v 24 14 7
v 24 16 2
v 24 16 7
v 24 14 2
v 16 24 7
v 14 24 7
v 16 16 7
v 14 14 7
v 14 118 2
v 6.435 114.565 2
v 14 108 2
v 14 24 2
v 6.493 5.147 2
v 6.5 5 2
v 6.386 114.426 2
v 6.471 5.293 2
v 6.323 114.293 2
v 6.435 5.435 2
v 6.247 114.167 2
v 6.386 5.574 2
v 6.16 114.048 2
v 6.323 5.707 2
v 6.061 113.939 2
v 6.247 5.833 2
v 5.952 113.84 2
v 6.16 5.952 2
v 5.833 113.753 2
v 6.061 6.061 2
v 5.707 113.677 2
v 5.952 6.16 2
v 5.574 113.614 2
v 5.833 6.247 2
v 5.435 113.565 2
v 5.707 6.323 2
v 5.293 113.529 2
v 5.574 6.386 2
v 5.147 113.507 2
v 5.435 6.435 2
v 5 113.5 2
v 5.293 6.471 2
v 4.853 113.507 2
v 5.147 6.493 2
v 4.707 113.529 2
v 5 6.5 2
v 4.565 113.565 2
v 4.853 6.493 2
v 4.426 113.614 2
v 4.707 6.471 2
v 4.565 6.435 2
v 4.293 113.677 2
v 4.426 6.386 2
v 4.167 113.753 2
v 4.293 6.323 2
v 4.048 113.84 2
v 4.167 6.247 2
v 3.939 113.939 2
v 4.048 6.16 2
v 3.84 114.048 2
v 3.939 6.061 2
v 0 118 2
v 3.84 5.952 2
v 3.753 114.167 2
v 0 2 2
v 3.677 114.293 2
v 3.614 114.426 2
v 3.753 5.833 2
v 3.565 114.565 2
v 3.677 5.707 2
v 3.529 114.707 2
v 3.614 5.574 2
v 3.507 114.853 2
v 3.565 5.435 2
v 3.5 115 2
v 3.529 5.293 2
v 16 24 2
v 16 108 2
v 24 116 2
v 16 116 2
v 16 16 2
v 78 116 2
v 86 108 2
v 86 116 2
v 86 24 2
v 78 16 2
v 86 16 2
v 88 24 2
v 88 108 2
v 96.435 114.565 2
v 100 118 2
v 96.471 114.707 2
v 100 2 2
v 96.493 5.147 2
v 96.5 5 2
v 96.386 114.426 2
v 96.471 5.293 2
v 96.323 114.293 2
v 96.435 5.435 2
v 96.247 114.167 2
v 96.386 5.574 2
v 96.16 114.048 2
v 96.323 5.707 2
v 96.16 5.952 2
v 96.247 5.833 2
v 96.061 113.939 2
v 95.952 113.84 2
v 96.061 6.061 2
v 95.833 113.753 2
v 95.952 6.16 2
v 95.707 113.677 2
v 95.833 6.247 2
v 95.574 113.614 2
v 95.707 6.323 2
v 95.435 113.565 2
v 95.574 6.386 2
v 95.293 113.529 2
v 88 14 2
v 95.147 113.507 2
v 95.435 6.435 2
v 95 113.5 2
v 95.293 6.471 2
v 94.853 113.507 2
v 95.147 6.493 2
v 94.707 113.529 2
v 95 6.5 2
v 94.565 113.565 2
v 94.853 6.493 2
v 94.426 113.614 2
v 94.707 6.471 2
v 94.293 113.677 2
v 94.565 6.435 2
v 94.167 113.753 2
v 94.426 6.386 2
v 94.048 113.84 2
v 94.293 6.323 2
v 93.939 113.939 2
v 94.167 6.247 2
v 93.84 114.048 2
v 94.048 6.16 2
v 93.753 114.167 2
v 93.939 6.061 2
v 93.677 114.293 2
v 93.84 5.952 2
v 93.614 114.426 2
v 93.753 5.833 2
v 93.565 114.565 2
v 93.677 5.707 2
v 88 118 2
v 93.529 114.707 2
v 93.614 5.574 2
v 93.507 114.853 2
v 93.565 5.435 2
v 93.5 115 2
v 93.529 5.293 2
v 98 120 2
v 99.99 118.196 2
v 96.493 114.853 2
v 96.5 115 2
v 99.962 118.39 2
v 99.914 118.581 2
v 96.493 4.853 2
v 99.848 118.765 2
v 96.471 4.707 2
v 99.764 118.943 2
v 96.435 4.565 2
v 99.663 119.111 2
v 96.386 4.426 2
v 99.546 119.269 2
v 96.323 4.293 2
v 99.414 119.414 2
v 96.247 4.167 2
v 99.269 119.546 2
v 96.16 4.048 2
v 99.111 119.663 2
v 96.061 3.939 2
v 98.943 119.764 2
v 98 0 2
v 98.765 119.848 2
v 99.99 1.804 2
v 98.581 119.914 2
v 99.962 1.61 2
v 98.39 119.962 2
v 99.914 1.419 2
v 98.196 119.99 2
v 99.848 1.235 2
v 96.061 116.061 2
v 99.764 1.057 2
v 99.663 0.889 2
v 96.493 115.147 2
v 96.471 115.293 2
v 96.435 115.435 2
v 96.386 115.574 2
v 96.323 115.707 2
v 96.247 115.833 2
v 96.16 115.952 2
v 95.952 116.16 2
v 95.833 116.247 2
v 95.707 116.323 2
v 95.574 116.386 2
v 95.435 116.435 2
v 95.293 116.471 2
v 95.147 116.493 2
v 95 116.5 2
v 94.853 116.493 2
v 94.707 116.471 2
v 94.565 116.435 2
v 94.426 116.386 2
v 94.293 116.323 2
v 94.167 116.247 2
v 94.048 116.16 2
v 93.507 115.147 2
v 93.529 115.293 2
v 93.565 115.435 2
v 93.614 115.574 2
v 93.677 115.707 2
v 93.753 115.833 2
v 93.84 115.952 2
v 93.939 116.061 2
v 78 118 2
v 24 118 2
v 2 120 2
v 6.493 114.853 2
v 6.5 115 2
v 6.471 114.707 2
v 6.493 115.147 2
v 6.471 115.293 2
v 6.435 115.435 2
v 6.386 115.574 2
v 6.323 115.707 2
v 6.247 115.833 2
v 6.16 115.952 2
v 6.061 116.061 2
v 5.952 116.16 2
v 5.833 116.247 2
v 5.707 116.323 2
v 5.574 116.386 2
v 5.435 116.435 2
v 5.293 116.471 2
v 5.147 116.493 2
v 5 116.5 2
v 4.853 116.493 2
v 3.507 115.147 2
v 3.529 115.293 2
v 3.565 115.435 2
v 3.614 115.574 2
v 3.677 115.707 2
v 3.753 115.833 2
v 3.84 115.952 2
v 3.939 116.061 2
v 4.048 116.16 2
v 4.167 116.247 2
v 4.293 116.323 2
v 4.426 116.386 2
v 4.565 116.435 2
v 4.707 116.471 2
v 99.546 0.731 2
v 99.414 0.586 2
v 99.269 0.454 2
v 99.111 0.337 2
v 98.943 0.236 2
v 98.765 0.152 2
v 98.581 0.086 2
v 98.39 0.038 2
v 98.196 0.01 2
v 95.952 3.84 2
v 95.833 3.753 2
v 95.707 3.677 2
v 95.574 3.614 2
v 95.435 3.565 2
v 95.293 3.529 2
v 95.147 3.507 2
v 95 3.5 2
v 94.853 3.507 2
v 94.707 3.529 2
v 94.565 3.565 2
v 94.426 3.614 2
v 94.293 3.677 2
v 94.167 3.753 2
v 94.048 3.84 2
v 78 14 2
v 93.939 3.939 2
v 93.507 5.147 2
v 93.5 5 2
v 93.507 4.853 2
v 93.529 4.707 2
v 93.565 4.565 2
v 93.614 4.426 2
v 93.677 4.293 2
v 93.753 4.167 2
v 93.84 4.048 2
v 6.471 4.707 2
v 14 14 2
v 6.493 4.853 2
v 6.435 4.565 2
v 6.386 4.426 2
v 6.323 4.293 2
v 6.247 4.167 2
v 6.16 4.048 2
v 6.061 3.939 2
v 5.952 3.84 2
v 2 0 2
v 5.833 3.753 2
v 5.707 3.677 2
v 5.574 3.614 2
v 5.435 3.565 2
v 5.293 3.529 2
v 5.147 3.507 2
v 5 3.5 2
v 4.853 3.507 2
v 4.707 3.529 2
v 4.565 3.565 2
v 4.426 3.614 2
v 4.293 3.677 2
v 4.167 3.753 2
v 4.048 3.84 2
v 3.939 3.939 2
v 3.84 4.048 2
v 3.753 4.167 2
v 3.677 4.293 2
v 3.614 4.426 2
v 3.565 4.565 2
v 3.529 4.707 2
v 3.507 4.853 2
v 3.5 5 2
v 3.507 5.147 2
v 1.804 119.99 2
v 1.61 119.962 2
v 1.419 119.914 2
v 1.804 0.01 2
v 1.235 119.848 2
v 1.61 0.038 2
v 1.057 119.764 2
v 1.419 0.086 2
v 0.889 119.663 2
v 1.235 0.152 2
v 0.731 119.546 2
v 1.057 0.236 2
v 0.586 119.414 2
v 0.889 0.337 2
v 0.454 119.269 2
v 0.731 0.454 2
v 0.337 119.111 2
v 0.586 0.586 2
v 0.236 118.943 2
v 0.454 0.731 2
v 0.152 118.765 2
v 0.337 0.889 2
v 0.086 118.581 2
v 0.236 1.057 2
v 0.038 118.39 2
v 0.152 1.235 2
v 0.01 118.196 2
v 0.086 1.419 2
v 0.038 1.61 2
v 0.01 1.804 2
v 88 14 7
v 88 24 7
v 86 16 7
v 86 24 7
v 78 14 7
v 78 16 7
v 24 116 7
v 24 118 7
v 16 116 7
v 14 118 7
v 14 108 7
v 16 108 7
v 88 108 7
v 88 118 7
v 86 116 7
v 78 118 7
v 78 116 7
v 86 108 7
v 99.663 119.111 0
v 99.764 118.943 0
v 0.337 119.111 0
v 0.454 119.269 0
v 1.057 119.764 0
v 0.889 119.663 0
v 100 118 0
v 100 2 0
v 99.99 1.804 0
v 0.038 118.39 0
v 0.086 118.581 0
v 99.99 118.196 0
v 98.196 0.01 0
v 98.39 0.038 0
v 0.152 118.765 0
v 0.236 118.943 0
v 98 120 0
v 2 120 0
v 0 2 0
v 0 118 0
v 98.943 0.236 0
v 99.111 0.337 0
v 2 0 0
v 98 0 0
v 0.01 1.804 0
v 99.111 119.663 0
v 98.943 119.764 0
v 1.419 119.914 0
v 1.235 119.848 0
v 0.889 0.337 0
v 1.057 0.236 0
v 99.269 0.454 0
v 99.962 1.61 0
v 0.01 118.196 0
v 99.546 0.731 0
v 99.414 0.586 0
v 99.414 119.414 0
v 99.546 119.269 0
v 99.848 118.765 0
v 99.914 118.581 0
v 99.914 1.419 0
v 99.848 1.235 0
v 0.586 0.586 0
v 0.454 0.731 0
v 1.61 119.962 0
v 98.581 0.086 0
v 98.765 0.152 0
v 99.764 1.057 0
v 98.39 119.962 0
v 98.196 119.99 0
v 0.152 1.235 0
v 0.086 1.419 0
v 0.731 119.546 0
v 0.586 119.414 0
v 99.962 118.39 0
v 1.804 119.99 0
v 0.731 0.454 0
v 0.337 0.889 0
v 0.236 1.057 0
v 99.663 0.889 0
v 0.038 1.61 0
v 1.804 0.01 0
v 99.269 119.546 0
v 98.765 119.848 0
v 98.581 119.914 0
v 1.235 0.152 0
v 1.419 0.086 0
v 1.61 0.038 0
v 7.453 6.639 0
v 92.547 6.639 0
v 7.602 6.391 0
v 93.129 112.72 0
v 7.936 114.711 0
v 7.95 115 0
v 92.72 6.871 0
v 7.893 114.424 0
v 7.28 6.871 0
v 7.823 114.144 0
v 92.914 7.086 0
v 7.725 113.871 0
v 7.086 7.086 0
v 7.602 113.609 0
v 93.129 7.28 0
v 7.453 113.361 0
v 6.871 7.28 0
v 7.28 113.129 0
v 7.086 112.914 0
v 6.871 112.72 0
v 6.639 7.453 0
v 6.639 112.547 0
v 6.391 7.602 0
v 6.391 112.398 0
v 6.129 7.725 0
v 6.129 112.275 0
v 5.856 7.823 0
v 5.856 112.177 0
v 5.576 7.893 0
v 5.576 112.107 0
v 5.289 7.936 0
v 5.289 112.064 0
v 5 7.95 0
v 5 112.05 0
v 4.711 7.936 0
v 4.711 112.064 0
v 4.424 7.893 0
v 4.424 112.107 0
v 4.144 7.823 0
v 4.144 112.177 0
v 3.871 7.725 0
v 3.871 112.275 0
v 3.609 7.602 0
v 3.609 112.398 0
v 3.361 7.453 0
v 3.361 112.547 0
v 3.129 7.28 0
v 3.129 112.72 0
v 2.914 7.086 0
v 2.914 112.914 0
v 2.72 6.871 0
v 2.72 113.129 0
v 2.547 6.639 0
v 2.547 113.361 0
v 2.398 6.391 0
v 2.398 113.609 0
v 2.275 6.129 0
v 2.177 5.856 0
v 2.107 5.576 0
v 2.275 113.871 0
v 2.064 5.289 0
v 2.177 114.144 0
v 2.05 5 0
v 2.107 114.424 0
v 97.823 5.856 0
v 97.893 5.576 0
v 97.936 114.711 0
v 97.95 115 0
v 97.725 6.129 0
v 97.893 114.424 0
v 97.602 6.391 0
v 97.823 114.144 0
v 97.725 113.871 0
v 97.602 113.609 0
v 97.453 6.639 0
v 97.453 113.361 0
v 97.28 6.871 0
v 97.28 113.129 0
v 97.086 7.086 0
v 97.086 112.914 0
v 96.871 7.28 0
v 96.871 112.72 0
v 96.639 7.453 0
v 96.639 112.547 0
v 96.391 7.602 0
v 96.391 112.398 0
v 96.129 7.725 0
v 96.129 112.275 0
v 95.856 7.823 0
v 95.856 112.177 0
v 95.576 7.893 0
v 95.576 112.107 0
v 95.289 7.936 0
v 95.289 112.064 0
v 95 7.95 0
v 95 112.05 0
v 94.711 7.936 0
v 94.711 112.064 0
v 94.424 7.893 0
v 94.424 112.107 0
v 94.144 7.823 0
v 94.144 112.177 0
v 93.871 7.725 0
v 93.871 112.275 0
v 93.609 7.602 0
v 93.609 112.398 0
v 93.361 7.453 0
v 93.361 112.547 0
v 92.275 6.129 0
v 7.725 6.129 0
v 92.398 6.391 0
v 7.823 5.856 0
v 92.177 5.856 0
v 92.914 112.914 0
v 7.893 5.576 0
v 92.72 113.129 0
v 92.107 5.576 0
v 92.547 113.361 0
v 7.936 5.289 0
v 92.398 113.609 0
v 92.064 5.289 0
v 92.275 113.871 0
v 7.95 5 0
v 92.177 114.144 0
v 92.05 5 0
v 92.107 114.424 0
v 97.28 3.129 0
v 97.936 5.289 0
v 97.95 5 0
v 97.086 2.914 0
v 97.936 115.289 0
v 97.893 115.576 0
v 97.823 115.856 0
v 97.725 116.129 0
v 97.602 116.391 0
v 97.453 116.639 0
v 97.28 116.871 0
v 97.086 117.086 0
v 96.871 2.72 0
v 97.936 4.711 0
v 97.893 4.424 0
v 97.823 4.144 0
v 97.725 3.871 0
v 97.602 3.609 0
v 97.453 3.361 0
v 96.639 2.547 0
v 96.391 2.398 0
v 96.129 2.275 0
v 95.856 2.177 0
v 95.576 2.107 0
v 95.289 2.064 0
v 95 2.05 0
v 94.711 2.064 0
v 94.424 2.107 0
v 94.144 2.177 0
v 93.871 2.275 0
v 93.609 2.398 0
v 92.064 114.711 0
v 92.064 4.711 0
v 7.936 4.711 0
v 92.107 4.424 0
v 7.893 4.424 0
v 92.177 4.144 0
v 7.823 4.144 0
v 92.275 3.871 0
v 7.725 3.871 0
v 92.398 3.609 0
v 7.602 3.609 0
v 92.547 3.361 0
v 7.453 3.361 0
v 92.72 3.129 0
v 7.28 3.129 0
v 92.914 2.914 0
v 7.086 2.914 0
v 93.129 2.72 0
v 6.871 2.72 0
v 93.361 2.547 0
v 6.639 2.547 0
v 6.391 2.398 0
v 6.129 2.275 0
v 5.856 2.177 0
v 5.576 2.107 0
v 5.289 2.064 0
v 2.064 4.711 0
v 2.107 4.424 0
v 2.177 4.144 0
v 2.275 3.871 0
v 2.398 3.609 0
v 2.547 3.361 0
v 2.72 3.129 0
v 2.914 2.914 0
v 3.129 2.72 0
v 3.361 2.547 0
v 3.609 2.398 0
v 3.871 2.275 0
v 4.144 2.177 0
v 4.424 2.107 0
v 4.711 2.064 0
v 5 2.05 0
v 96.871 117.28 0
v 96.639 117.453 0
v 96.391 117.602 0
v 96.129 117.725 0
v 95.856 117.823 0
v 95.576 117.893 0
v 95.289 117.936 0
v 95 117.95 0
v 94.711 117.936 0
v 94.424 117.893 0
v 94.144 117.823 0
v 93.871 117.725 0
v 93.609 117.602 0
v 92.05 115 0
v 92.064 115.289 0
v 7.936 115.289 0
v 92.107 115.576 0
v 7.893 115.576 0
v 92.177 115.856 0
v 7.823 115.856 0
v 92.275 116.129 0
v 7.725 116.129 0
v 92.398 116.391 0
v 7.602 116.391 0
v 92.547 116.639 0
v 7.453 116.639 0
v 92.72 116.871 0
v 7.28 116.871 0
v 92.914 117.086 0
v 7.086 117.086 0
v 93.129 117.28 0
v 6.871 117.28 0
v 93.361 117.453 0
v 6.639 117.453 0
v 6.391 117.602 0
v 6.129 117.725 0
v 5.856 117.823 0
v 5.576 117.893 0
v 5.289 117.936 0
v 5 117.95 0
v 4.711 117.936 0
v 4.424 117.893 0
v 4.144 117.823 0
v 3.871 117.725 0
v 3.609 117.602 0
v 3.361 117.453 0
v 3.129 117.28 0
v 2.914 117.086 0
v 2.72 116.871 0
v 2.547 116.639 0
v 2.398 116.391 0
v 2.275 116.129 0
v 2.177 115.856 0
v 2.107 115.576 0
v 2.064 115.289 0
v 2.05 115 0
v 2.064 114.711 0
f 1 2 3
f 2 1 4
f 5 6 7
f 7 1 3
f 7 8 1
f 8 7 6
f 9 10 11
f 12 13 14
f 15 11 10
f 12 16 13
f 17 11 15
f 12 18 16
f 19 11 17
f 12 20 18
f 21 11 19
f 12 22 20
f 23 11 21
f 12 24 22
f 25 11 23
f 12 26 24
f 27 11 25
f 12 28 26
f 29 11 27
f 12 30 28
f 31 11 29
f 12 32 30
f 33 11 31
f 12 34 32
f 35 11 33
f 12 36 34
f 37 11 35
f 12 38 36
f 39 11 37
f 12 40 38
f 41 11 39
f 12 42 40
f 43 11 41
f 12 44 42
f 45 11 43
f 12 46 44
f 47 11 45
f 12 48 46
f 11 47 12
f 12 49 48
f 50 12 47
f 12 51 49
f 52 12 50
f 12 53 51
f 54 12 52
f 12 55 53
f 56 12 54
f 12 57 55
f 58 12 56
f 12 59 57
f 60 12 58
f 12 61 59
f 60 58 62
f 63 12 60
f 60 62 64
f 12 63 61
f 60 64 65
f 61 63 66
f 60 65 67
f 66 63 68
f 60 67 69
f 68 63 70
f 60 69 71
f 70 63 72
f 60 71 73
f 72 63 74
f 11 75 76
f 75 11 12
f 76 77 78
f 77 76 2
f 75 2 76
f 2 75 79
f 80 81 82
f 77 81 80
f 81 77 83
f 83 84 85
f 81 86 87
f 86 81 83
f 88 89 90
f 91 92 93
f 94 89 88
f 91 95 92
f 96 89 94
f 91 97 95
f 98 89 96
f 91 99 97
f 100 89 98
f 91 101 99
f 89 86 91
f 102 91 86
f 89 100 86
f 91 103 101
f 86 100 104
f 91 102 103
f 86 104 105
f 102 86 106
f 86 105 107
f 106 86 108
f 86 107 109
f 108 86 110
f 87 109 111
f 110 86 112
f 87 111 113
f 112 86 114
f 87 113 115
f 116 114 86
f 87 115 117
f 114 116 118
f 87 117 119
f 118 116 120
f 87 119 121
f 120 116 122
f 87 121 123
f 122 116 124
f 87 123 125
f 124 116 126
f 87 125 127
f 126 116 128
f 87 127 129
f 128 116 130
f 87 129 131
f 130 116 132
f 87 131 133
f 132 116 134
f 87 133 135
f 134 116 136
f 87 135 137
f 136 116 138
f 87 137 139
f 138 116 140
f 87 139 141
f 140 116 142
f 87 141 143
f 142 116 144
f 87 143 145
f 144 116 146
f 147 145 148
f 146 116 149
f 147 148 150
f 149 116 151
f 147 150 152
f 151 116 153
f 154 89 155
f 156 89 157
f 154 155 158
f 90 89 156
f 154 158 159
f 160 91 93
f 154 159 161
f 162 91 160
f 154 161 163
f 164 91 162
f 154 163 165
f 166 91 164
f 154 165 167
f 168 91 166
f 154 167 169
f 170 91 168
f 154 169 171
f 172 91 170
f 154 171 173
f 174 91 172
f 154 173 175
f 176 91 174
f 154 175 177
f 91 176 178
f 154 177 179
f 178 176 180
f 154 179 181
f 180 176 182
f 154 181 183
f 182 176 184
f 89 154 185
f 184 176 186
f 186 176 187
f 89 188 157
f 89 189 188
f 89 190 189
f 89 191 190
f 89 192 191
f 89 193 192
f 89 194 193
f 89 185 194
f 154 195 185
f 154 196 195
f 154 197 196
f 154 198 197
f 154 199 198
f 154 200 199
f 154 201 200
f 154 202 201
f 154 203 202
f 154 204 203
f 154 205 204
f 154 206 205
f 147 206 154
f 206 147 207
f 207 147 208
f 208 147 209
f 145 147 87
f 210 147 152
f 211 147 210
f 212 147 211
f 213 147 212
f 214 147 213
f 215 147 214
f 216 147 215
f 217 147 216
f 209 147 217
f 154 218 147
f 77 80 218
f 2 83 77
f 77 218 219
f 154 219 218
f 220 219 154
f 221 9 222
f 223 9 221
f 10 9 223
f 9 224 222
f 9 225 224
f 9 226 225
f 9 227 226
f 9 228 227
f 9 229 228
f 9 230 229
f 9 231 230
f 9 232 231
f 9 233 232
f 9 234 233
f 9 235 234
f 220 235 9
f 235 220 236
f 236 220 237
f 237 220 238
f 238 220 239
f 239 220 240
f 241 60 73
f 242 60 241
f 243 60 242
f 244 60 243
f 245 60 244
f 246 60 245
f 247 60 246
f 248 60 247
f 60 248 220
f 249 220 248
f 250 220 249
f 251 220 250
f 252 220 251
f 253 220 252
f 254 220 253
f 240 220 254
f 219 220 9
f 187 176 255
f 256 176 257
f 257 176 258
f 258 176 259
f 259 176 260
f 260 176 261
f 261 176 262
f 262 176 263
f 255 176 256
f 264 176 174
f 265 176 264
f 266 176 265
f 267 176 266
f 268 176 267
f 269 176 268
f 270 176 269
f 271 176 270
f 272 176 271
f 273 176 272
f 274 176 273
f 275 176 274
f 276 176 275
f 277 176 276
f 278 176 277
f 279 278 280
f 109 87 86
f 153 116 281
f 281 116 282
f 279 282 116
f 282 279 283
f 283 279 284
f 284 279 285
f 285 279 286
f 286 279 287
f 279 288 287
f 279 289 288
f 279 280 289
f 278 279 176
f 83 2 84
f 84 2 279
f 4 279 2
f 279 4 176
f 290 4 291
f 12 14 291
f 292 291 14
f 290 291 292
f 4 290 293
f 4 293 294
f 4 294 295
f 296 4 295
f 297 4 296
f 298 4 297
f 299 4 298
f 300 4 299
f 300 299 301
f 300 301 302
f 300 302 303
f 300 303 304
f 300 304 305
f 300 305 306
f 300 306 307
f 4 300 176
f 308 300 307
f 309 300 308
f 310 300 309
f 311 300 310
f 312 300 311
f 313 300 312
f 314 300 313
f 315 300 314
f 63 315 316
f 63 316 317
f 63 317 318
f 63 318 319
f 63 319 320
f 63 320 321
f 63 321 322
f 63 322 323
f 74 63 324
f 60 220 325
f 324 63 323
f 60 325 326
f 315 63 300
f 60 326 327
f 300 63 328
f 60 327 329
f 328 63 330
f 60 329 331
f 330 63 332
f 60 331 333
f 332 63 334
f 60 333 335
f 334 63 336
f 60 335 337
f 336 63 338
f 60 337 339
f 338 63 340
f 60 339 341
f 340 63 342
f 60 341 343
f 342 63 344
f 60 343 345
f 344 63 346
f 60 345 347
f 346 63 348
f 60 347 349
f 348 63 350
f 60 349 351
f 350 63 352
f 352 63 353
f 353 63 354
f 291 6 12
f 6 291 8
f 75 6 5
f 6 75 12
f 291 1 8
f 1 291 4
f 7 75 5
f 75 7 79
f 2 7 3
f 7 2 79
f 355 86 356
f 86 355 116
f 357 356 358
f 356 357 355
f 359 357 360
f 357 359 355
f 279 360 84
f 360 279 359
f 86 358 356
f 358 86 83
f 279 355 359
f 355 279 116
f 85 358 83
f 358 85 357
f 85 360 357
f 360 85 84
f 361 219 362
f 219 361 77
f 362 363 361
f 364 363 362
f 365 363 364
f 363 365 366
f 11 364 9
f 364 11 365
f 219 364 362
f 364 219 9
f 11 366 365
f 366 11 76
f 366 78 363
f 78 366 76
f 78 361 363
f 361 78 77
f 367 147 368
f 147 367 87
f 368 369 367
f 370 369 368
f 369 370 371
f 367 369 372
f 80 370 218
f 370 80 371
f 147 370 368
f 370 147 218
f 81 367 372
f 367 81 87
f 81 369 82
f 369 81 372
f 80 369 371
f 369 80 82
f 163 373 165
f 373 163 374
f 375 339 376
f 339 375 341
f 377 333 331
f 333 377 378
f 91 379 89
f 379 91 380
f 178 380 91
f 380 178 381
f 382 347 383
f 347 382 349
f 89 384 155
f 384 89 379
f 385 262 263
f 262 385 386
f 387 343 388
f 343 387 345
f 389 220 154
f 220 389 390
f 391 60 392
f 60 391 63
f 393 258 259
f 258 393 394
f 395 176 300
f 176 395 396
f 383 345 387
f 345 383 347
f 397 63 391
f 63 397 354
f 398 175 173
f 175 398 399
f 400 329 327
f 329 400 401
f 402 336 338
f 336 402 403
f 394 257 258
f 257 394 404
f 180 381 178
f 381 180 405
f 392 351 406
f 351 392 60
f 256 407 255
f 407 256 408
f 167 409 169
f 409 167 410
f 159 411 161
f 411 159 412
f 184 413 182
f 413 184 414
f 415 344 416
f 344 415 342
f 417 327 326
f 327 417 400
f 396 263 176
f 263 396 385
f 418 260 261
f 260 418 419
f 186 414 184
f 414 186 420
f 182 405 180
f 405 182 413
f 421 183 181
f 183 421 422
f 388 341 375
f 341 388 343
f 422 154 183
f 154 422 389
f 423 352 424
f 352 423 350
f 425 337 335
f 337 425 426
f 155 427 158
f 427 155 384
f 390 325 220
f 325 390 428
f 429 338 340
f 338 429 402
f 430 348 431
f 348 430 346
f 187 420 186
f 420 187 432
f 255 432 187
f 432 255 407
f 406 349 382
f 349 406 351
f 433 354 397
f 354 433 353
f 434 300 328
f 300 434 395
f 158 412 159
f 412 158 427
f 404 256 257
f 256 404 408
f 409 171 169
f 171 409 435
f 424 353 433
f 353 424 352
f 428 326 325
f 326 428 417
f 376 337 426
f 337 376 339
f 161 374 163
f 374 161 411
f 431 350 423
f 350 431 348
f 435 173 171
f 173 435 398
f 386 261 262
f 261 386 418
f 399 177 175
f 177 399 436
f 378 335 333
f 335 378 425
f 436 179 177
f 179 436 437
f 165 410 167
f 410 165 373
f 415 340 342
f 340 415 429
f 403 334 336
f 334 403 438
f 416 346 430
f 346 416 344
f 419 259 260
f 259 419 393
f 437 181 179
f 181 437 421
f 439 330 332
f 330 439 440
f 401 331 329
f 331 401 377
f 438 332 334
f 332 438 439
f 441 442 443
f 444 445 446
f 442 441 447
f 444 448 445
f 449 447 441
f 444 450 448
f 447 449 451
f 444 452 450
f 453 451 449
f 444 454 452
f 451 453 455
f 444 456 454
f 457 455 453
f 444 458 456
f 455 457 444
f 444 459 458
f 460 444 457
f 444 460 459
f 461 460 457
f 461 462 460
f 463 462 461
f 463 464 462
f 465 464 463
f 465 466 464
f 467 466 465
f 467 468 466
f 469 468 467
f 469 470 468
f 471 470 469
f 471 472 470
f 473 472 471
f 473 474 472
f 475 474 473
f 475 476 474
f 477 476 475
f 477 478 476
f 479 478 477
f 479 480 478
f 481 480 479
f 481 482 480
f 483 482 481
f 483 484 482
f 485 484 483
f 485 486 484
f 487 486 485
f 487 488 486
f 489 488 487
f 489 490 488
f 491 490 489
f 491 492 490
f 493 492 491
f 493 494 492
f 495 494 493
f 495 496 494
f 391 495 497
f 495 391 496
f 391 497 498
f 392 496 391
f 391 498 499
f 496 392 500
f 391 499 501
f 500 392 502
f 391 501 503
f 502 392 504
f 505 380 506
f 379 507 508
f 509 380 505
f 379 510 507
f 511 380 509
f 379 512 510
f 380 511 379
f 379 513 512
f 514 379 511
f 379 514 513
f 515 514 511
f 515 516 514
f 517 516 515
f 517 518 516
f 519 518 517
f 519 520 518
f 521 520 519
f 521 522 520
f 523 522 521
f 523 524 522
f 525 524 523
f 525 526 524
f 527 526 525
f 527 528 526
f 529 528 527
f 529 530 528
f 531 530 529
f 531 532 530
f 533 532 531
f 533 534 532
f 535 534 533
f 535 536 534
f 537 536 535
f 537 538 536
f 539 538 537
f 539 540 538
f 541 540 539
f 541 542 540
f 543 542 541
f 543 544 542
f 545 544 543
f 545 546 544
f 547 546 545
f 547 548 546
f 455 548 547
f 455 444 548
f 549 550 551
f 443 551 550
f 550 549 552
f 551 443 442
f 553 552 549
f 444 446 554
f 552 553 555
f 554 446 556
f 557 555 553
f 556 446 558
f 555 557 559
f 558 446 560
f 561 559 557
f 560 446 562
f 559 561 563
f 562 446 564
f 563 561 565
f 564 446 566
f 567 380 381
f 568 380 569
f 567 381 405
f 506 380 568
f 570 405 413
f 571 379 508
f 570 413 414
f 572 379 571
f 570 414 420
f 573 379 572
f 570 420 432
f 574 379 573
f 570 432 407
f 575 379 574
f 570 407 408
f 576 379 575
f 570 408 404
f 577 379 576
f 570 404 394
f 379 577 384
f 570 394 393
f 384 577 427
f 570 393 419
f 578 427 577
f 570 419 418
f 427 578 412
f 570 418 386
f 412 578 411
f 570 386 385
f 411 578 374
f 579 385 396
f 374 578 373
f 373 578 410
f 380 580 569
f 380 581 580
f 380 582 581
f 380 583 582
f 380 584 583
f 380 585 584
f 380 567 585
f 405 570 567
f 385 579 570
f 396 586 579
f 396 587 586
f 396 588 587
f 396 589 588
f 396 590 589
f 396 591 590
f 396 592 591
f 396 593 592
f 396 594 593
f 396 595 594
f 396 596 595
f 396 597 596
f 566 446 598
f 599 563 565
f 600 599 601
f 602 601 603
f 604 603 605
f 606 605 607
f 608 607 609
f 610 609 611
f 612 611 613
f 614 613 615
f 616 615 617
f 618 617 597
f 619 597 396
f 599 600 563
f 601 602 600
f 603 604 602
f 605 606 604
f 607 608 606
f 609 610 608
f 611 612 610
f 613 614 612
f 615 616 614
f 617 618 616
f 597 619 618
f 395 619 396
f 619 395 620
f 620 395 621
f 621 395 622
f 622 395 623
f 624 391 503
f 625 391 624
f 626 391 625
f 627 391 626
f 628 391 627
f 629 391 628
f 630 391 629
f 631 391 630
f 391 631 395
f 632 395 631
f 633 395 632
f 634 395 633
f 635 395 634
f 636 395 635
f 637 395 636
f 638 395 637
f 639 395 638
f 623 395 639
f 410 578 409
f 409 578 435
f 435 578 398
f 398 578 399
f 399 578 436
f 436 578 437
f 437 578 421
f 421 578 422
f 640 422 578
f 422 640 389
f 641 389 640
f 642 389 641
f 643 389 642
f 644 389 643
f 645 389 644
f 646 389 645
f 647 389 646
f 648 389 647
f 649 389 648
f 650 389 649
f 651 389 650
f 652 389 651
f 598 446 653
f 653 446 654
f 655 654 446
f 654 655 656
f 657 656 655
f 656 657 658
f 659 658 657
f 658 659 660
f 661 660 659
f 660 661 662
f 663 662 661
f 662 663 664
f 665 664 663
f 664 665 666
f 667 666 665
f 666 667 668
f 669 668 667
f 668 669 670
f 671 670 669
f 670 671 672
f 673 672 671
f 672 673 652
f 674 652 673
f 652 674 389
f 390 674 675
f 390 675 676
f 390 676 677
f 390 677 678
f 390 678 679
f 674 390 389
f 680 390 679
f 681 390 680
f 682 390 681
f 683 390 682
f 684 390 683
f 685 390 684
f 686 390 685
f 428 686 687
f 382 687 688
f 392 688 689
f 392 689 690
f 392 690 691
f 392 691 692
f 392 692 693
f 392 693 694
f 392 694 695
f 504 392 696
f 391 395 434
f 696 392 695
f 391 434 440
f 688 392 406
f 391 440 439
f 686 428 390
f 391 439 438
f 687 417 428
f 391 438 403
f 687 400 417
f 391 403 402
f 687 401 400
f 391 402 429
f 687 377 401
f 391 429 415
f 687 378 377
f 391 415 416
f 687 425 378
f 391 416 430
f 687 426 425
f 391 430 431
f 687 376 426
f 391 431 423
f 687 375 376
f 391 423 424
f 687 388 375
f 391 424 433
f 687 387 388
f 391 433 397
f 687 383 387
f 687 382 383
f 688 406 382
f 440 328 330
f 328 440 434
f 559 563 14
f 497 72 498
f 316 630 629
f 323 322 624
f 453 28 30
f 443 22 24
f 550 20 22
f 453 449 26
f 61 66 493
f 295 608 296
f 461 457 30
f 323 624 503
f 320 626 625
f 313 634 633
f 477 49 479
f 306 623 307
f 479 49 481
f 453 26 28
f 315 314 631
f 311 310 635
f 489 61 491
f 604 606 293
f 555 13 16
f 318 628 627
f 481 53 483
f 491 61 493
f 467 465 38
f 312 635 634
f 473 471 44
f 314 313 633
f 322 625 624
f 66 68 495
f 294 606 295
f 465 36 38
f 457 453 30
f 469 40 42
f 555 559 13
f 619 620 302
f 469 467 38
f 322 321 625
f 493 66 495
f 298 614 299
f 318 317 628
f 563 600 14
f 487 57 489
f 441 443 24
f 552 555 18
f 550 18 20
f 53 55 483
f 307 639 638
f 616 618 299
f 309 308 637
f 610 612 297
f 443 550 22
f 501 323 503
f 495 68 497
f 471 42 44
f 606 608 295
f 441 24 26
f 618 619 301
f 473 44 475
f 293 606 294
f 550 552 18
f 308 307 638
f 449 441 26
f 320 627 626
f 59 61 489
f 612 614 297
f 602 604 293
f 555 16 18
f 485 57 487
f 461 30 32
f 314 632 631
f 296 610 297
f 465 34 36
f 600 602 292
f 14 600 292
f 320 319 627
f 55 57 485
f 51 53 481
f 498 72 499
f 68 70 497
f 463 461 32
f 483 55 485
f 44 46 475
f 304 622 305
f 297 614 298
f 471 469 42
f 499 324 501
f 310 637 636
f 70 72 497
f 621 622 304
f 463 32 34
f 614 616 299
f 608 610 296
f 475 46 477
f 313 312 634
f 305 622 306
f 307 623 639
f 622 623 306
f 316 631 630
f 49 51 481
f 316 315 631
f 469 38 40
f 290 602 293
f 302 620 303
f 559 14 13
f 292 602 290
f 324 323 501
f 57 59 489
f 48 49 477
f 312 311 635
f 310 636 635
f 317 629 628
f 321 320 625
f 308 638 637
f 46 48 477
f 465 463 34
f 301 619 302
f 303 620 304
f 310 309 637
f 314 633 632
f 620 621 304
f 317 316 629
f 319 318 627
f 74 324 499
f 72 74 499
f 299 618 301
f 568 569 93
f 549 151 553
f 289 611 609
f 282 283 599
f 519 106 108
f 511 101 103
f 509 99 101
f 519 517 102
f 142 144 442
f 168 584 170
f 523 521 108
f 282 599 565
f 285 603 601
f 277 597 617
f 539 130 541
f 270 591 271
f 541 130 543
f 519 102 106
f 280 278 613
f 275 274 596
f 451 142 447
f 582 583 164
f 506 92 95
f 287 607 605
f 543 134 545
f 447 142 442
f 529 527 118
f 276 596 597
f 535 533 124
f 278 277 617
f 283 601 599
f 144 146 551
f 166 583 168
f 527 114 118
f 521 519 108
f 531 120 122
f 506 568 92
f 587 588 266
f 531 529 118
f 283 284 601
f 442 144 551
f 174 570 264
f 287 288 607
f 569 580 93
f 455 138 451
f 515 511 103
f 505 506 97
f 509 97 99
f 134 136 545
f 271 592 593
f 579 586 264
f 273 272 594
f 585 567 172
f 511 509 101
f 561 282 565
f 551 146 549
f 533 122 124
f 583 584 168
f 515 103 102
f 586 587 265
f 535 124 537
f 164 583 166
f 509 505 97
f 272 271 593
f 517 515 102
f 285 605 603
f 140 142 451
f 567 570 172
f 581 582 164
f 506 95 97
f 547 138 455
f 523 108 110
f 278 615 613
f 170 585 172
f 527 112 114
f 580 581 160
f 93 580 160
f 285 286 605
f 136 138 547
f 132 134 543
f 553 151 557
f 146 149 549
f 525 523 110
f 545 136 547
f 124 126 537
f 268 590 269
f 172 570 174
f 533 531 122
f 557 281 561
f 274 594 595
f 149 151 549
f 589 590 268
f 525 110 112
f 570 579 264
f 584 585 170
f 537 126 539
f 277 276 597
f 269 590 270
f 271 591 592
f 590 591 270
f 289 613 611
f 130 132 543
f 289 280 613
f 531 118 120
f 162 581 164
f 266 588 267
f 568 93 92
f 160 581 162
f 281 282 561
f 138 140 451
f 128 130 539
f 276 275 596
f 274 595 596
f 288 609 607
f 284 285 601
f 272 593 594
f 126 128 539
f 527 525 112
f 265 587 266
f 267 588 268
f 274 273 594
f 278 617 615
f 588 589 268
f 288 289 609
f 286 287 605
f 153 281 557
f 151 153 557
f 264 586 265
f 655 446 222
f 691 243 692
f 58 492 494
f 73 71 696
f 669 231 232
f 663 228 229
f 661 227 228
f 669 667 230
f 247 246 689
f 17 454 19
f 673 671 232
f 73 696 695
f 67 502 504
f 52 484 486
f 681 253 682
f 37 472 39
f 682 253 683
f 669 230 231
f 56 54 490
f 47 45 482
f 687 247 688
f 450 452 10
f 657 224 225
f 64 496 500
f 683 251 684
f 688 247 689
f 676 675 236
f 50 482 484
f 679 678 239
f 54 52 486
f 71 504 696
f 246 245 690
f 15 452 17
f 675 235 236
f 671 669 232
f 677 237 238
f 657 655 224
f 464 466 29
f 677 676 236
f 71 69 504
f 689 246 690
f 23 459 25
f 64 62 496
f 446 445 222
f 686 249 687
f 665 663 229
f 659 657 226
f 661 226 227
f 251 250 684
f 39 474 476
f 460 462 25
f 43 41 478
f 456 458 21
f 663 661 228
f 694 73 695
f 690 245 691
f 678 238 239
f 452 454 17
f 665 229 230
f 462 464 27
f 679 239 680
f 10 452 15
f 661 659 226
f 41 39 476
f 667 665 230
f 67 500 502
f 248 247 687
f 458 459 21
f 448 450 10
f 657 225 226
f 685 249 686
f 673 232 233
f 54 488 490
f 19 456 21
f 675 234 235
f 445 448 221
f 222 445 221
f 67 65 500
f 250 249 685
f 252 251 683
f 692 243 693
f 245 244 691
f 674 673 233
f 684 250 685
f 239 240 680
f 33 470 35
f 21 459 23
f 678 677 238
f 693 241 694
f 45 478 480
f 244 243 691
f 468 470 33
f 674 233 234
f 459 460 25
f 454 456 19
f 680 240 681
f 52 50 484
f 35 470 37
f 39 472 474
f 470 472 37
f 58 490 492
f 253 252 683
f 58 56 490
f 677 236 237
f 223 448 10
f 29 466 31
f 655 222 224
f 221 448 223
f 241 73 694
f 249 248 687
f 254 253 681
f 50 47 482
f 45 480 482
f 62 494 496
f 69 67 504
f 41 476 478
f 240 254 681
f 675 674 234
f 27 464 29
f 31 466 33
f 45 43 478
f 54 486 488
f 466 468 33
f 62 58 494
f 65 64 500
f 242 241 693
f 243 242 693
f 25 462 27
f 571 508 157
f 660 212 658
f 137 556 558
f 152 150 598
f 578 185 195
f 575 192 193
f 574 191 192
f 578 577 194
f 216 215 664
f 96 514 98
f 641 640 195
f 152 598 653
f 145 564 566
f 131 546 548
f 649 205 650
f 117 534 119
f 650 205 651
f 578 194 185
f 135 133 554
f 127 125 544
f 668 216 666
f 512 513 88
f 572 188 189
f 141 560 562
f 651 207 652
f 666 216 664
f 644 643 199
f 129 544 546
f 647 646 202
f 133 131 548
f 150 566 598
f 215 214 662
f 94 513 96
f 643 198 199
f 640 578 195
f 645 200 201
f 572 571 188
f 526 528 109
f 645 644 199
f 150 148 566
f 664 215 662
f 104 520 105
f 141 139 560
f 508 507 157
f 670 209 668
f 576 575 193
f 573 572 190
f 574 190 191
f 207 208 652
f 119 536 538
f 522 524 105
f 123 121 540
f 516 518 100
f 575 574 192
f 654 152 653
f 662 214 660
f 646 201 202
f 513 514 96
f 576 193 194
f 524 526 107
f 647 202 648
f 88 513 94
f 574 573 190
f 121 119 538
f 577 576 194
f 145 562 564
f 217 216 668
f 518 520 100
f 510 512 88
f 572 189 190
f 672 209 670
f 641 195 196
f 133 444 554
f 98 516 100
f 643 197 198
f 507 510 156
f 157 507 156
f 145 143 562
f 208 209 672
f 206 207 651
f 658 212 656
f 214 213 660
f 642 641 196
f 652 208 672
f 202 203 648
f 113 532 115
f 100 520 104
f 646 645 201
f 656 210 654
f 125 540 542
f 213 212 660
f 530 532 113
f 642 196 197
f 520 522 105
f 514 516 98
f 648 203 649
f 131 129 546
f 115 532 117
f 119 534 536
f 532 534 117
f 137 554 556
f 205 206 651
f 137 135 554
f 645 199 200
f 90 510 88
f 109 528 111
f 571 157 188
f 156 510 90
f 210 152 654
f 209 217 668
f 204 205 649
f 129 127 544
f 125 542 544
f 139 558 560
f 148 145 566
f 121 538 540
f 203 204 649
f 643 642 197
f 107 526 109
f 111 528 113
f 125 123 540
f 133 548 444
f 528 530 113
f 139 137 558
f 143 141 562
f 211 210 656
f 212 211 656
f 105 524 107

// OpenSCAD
$fn=64;

difference() {
  union() {
    minkowski() {
      translate([2, 2, 0]) cube([100-2*2, 120-2*2, 1]);
      cylinder(h=1, r=2);
    }
    // Front left brace.
    translate([14, 14, 2]) difference() {
      cube([10, 10, 5]);
      translate([2, 2, 0]) cube([8, 8, 5]);
    }
    // Front right brace.
    translate([100-10-14+2, 14, 2]) difference() {
      cube([10, 10, 5]);
      translate([0, 2, 0]) cube([8, 8, 5]);
    }
    // Back left brace.
    translate([14, 120-10-2, 2]) difference() {
      cube([10, 10, 5]);
      translate([2, 0, 0]) cube([8, 8, 5]);
    }
    // Back right brace.
    translate([100-10-14+2, 120-10-2, 2]) difference() {
      cube([10, 10, 5]);
      translate([0, 0, 0]) cube([8, 8, 5]);
    }
  }
  union() {
    // Countersunk screw holes.
    translate([5, 5, 0]) union() {
      cylinder(h=5, d=3);
      translate([0, 0, 0]) cylinder(h=2, d1=5.9, d2=3);
    }
    translate([100-5, 5, 0]) union() {
      cylinder(h=5, d=3);
      translate([0, 0, 0]) cylinder(h=2, d1=5.9, d2=3);
    }
    translate([5, 120-5, 0]) union() {
      cylinder(h=5, d=3);
      translate([0, 0, 0]) cylinder(h=2, d1=5.9, d2=3);
    }
    translate([100-5, 120-5, 0]) union() {
      cylinder(h=5, d=3);
      translate([0, 0, 0]) cylinder(h=2, d1=5.9, d2=3);
    }
    
    // Temp jig.
//    translate([0, 0, 0]) cube([100, 14, 2]);
//    translate([0, 0, 0]) cube([14, 120, 2]);
//    translate([100-14+2, 0, 0]) cube([14, 120, 2]);
//    translate([14+2, 14+2, 0]) cube([70, 100, 2]);
//    translate([0, 0, 0]), cube([100, 120, 2]);
  }
}
